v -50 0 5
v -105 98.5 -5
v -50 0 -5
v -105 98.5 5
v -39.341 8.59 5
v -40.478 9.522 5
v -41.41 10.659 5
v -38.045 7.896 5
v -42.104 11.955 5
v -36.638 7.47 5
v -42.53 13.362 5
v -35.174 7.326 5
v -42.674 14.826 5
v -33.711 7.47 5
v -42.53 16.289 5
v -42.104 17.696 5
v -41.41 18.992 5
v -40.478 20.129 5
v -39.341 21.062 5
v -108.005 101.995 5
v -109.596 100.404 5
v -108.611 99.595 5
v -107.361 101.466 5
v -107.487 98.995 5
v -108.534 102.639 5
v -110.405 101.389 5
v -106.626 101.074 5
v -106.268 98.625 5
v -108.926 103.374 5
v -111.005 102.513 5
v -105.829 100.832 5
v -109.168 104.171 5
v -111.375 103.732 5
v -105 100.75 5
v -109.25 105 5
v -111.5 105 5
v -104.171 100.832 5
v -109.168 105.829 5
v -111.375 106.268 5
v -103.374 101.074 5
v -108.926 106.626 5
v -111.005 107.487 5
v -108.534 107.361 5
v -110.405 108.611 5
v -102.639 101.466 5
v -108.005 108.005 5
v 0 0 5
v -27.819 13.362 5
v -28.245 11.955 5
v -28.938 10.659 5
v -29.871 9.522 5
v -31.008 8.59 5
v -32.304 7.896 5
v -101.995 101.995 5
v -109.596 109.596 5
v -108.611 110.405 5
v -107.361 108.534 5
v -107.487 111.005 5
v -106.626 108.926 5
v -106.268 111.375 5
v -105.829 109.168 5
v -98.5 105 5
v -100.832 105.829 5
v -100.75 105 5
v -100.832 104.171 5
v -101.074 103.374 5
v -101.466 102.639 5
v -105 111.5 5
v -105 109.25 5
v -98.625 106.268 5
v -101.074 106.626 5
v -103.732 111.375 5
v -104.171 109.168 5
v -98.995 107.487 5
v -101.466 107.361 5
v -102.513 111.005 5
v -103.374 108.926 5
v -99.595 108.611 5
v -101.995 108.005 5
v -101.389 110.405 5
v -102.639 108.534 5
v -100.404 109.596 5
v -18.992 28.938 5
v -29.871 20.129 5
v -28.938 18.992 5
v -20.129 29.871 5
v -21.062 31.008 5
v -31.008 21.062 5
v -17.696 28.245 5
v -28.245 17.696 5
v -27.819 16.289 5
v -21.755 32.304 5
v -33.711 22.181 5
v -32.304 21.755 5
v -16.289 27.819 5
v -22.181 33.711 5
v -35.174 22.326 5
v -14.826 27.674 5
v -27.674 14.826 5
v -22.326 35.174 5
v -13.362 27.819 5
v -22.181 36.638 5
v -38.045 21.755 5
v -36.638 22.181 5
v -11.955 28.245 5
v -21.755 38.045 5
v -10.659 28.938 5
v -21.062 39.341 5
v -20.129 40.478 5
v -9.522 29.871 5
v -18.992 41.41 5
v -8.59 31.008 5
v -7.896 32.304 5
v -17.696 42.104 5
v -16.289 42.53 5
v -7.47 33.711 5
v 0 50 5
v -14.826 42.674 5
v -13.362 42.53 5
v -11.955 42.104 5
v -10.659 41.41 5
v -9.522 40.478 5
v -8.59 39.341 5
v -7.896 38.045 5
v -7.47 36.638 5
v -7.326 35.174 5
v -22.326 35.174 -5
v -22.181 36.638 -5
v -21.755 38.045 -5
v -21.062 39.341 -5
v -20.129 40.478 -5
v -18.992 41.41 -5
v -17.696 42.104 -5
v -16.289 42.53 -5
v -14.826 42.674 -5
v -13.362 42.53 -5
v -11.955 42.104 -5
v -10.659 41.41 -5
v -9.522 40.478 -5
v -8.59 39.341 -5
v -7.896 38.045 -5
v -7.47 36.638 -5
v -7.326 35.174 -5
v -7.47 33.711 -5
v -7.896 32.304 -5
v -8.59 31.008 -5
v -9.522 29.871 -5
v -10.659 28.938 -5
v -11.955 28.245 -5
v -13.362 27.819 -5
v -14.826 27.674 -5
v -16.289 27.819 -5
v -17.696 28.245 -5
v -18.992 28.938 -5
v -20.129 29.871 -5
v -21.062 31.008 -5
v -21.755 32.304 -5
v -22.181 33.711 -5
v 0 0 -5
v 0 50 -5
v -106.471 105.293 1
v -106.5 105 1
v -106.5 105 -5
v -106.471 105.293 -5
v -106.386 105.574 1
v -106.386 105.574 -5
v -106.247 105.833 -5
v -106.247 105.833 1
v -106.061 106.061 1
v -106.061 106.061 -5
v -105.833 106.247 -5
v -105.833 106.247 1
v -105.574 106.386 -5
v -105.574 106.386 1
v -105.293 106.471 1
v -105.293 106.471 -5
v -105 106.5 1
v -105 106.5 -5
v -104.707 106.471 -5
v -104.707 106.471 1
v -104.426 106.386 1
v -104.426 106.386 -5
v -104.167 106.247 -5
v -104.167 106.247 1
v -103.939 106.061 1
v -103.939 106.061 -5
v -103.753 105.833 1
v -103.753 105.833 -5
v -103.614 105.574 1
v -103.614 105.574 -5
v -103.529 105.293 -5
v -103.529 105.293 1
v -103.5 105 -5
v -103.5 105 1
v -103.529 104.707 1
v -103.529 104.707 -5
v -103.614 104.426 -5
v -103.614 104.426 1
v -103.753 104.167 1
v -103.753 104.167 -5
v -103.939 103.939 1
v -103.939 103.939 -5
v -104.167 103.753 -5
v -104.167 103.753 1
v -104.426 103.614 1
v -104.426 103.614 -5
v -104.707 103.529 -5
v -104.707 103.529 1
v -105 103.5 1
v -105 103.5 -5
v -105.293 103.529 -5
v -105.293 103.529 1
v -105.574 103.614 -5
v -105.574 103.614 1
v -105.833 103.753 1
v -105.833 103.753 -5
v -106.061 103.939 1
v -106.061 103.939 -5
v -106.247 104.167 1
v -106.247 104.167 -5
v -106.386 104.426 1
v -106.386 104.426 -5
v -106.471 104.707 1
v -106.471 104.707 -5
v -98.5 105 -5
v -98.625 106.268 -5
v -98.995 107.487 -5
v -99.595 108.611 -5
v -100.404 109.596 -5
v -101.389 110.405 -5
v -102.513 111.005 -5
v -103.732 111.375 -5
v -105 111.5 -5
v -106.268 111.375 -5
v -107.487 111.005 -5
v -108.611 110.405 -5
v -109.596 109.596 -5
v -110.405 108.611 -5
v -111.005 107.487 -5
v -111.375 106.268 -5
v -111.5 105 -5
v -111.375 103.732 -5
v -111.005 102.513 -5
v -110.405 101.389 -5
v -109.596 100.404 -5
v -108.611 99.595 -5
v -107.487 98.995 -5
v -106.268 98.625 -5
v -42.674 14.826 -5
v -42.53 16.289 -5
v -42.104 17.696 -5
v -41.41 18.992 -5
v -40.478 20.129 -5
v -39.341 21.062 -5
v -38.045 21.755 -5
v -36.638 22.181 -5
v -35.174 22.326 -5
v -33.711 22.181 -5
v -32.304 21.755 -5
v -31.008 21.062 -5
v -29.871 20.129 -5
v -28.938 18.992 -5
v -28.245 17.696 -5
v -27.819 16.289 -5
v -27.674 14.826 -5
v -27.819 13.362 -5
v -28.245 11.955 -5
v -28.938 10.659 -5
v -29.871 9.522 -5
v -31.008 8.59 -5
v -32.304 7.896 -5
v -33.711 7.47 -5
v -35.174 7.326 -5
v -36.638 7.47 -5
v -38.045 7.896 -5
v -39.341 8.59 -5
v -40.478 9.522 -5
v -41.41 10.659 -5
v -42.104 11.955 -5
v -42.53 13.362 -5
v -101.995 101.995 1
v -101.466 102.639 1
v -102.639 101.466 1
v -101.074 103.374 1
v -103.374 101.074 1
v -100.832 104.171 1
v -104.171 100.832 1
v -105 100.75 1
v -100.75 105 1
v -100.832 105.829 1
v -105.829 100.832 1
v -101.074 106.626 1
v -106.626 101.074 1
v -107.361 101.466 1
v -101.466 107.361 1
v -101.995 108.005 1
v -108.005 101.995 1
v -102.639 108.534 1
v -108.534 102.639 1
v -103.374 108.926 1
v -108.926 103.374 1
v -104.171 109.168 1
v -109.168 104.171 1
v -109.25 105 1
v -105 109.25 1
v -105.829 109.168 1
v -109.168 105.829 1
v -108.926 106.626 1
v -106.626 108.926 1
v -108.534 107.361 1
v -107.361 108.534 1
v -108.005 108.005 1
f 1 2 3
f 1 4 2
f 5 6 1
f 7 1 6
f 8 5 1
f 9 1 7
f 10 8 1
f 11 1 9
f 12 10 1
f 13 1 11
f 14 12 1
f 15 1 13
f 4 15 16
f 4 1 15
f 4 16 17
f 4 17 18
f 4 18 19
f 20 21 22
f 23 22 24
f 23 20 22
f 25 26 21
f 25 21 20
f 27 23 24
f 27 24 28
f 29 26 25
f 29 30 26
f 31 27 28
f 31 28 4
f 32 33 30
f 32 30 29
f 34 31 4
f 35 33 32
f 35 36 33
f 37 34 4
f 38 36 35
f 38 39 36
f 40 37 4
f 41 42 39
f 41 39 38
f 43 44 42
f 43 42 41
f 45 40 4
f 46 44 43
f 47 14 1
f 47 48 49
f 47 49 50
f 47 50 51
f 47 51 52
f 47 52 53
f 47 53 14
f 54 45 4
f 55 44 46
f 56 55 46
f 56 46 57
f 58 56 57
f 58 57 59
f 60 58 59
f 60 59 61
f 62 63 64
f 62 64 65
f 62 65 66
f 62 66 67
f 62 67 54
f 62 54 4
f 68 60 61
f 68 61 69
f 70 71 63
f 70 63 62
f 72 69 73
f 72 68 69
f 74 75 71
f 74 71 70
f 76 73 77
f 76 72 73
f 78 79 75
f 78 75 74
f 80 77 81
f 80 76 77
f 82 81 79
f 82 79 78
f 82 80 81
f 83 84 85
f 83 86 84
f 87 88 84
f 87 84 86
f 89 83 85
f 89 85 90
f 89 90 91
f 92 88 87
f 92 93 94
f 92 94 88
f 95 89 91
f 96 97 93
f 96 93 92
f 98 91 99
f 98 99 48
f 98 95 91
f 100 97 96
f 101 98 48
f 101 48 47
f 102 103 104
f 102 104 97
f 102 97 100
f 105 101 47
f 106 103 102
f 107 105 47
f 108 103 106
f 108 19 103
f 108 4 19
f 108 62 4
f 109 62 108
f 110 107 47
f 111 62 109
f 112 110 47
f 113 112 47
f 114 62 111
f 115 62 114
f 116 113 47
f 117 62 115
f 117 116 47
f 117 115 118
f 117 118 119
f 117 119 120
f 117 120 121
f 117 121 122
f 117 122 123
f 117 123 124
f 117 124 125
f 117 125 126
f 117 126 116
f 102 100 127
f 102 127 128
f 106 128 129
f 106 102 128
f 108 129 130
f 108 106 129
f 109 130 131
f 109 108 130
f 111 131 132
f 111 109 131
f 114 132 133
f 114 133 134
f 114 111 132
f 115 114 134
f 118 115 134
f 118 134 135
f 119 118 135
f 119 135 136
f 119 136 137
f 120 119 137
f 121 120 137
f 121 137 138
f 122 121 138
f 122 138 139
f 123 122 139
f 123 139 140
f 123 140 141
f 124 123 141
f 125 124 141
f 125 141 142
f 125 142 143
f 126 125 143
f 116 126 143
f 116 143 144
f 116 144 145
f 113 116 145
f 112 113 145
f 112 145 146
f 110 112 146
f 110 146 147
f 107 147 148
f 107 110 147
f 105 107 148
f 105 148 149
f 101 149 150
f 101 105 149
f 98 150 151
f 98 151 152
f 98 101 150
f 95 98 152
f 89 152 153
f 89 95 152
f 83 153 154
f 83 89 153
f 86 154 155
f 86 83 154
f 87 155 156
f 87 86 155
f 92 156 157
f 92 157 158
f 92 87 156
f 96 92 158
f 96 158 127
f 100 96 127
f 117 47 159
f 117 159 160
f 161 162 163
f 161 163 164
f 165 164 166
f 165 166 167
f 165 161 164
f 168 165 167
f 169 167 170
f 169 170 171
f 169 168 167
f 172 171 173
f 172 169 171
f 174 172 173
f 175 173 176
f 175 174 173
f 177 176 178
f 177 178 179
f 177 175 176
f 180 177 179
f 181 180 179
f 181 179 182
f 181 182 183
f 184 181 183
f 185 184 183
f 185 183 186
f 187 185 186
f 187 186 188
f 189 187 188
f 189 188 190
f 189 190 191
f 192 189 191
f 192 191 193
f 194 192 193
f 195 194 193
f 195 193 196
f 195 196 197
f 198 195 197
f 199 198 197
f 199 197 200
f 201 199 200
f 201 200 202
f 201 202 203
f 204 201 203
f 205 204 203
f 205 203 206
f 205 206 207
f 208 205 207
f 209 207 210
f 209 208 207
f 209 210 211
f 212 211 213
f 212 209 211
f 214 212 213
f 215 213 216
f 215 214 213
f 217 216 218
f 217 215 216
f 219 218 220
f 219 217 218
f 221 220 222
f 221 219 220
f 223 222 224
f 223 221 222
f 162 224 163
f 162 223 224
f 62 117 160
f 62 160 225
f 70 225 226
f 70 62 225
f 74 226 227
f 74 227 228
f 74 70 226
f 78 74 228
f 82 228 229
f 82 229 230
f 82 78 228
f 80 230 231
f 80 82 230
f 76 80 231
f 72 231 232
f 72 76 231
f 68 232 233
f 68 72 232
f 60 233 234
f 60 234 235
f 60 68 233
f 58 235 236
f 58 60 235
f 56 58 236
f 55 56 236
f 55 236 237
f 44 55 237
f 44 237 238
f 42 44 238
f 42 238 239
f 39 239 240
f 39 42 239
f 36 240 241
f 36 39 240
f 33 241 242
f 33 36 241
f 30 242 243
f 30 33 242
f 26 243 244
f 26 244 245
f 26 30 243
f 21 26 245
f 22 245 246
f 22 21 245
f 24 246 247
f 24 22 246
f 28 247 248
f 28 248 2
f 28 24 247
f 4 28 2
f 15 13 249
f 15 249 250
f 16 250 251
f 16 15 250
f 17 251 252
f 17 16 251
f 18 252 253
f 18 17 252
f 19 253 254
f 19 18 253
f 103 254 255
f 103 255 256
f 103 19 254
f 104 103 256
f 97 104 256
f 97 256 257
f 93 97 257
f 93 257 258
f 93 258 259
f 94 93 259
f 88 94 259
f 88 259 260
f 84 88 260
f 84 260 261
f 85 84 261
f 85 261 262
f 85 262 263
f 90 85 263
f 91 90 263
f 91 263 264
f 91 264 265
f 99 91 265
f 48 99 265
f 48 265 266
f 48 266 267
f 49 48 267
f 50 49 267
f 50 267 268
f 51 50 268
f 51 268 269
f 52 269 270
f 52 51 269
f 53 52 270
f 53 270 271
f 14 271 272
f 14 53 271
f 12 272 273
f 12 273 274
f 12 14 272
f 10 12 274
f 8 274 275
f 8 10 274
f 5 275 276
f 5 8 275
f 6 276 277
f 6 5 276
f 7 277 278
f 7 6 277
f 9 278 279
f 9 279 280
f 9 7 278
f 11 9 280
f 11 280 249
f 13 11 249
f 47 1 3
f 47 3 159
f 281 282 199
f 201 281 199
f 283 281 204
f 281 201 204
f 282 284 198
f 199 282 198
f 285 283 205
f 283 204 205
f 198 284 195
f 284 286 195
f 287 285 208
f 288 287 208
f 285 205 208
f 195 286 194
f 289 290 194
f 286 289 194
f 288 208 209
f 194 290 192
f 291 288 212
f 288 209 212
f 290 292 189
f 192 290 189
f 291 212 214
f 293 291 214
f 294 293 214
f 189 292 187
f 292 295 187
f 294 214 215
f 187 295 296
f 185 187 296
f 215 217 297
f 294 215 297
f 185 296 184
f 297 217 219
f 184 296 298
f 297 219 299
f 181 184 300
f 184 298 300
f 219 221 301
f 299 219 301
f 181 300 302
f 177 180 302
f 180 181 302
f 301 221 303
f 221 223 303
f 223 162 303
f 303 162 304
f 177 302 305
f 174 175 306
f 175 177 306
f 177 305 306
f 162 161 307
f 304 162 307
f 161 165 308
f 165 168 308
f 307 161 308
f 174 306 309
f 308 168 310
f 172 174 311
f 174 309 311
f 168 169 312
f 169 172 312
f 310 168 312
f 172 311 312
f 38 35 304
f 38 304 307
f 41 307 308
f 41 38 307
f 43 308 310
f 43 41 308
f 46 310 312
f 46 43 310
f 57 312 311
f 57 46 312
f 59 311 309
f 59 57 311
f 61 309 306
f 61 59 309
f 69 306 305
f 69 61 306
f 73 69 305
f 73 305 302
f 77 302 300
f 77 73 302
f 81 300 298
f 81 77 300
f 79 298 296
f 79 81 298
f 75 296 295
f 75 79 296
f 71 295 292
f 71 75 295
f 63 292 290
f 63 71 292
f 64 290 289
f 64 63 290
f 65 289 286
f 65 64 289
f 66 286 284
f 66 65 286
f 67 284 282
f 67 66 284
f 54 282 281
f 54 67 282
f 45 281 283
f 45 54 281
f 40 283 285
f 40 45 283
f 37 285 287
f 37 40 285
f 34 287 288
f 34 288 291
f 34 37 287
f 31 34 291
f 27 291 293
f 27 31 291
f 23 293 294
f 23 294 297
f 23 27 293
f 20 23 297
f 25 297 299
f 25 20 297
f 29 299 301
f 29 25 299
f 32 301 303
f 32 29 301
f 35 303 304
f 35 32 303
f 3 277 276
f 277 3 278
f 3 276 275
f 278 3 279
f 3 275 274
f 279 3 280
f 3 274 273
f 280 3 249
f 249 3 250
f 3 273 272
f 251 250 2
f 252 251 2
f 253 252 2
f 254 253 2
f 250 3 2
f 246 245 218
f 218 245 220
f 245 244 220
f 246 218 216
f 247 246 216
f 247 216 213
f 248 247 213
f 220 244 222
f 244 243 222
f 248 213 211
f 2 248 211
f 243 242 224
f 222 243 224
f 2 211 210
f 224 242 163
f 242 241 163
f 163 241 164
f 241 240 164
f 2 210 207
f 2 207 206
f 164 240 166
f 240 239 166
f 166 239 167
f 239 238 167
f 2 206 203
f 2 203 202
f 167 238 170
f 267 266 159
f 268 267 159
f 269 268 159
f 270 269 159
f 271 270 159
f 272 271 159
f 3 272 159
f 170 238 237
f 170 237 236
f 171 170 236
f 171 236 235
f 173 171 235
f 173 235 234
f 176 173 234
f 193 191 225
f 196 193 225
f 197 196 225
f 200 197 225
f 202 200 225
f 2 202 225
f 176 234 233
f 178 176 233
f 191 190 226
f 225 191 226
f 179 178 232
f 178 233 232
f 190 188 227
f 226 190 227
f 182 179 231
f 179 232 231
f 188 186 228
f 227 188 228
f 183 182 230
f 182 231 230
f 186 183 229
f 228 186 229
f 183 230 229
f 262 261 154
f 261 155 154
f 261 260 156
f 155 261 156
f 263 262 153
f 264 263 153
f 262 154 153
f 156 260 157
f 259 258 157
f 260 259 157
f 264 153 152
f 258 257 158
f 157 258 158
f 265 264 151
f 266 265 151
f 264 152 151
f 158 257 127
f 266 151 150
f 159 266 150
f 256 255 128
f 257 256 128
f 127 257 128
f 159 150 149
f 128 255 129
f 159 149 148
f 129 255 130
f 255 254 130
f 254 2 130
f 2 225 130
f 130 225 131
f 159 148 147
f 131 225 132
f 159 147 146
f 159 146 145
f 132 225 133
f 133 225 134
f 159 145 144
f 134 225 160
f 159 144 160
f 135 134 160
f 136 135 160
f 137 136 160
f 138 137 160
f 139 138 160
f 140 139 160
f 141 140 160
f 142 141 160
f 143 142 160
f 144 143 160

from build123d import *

# Parameters (mm, degrees)
RESSALTO_EXTRUS_O2_DEPTH = 5
ESBO_O4_R                = 4.25
CORTE_EXTRUS_O1_DEPTH    = 4
ESBO_O5_R                = 1.5
CORTE_EXTRUS_O2_DEPTH    = 7
ESBO_O6_R                = 7.5
CORTE_EXTRUS_O3_DEPTH    = 11


with BuildPart() as part:
    # Esboço3 → Ressalto-extrusão2 (new body, symmetric)
    with BuildSketch(Plane.XY):
        with BuildLine():
            Line((0, 50), (98.5, 105))
            ThreePointArc((98.5, 105), (109.596194078, 109.596194078), (105, 98.5))
            Line((105, 98.5), (50, 0))
            Line((50, 0), (0, 0))
            Line((0, 0), (0, 50))
        make_face()
    extrude(amount=RESSALTO_EXTRUS_O2_DEPTH, both=True)

    # Esboço4 → Corte-extrusão1 (cut)
    with BuildSketch(Plane.XY.offset(5)):
        with Locations((105, 105)):
            Circle(ESBO_O4_R)
    extrude(amount=-CORTE_EXTRUS_O1_DEPTH, mode=Mode.SUBTRACT)

    # Esboço5 → Corte-extrusão2 (cut, through all)
    with BuildSketch(Plane.XY.offset(1)):
        with Locations((105, 105)):
            Circle(ESBO_O5_R)
    extrude(amount=-CORTE_EXTRUS_O2_DEPTH, mode=Mode.SUBTRACT)

    # Esboço6 → Corte-extrusão3 (cut, through all)
    with BuildSketch(Plane.XY.offset(5)):
        with Locations((14.825558834, 35.174441166)):
            Circle(ESBO_O6_R)
        with Locations((35.174441166, 14.825558834)):
            Circle(ESBO_O6_R)
    extrude(amount=-CORTE_EXTRUS_O3_DEPTH, mode=Mode.SUBTRACT)


with BuildPart() as body_2:
    # Espelhar1: mirrored copy
    add(part.part.mirror(Plane(origin=(0, 0, 5), x_dir=(0, 0, 1), z_dir=(0, 1, 0))))


with BuildPart() as body_3:
    # Espelhar2: mirrored copy
    add(body_2.part.mirror(Plane(origin=(0, 0, 5), x_dir=(0, 0, 1), z_dir=(1, 0, 0))))


with BuildPart() as body_4:
    # Espelhar2 2: mirrored copy
    add(part.part.mirror(Plane(origin=(0, 0, 5), x_dir=(0, 0, 1), z_dir=(1, 0, 0))))


solid = body_4.part
